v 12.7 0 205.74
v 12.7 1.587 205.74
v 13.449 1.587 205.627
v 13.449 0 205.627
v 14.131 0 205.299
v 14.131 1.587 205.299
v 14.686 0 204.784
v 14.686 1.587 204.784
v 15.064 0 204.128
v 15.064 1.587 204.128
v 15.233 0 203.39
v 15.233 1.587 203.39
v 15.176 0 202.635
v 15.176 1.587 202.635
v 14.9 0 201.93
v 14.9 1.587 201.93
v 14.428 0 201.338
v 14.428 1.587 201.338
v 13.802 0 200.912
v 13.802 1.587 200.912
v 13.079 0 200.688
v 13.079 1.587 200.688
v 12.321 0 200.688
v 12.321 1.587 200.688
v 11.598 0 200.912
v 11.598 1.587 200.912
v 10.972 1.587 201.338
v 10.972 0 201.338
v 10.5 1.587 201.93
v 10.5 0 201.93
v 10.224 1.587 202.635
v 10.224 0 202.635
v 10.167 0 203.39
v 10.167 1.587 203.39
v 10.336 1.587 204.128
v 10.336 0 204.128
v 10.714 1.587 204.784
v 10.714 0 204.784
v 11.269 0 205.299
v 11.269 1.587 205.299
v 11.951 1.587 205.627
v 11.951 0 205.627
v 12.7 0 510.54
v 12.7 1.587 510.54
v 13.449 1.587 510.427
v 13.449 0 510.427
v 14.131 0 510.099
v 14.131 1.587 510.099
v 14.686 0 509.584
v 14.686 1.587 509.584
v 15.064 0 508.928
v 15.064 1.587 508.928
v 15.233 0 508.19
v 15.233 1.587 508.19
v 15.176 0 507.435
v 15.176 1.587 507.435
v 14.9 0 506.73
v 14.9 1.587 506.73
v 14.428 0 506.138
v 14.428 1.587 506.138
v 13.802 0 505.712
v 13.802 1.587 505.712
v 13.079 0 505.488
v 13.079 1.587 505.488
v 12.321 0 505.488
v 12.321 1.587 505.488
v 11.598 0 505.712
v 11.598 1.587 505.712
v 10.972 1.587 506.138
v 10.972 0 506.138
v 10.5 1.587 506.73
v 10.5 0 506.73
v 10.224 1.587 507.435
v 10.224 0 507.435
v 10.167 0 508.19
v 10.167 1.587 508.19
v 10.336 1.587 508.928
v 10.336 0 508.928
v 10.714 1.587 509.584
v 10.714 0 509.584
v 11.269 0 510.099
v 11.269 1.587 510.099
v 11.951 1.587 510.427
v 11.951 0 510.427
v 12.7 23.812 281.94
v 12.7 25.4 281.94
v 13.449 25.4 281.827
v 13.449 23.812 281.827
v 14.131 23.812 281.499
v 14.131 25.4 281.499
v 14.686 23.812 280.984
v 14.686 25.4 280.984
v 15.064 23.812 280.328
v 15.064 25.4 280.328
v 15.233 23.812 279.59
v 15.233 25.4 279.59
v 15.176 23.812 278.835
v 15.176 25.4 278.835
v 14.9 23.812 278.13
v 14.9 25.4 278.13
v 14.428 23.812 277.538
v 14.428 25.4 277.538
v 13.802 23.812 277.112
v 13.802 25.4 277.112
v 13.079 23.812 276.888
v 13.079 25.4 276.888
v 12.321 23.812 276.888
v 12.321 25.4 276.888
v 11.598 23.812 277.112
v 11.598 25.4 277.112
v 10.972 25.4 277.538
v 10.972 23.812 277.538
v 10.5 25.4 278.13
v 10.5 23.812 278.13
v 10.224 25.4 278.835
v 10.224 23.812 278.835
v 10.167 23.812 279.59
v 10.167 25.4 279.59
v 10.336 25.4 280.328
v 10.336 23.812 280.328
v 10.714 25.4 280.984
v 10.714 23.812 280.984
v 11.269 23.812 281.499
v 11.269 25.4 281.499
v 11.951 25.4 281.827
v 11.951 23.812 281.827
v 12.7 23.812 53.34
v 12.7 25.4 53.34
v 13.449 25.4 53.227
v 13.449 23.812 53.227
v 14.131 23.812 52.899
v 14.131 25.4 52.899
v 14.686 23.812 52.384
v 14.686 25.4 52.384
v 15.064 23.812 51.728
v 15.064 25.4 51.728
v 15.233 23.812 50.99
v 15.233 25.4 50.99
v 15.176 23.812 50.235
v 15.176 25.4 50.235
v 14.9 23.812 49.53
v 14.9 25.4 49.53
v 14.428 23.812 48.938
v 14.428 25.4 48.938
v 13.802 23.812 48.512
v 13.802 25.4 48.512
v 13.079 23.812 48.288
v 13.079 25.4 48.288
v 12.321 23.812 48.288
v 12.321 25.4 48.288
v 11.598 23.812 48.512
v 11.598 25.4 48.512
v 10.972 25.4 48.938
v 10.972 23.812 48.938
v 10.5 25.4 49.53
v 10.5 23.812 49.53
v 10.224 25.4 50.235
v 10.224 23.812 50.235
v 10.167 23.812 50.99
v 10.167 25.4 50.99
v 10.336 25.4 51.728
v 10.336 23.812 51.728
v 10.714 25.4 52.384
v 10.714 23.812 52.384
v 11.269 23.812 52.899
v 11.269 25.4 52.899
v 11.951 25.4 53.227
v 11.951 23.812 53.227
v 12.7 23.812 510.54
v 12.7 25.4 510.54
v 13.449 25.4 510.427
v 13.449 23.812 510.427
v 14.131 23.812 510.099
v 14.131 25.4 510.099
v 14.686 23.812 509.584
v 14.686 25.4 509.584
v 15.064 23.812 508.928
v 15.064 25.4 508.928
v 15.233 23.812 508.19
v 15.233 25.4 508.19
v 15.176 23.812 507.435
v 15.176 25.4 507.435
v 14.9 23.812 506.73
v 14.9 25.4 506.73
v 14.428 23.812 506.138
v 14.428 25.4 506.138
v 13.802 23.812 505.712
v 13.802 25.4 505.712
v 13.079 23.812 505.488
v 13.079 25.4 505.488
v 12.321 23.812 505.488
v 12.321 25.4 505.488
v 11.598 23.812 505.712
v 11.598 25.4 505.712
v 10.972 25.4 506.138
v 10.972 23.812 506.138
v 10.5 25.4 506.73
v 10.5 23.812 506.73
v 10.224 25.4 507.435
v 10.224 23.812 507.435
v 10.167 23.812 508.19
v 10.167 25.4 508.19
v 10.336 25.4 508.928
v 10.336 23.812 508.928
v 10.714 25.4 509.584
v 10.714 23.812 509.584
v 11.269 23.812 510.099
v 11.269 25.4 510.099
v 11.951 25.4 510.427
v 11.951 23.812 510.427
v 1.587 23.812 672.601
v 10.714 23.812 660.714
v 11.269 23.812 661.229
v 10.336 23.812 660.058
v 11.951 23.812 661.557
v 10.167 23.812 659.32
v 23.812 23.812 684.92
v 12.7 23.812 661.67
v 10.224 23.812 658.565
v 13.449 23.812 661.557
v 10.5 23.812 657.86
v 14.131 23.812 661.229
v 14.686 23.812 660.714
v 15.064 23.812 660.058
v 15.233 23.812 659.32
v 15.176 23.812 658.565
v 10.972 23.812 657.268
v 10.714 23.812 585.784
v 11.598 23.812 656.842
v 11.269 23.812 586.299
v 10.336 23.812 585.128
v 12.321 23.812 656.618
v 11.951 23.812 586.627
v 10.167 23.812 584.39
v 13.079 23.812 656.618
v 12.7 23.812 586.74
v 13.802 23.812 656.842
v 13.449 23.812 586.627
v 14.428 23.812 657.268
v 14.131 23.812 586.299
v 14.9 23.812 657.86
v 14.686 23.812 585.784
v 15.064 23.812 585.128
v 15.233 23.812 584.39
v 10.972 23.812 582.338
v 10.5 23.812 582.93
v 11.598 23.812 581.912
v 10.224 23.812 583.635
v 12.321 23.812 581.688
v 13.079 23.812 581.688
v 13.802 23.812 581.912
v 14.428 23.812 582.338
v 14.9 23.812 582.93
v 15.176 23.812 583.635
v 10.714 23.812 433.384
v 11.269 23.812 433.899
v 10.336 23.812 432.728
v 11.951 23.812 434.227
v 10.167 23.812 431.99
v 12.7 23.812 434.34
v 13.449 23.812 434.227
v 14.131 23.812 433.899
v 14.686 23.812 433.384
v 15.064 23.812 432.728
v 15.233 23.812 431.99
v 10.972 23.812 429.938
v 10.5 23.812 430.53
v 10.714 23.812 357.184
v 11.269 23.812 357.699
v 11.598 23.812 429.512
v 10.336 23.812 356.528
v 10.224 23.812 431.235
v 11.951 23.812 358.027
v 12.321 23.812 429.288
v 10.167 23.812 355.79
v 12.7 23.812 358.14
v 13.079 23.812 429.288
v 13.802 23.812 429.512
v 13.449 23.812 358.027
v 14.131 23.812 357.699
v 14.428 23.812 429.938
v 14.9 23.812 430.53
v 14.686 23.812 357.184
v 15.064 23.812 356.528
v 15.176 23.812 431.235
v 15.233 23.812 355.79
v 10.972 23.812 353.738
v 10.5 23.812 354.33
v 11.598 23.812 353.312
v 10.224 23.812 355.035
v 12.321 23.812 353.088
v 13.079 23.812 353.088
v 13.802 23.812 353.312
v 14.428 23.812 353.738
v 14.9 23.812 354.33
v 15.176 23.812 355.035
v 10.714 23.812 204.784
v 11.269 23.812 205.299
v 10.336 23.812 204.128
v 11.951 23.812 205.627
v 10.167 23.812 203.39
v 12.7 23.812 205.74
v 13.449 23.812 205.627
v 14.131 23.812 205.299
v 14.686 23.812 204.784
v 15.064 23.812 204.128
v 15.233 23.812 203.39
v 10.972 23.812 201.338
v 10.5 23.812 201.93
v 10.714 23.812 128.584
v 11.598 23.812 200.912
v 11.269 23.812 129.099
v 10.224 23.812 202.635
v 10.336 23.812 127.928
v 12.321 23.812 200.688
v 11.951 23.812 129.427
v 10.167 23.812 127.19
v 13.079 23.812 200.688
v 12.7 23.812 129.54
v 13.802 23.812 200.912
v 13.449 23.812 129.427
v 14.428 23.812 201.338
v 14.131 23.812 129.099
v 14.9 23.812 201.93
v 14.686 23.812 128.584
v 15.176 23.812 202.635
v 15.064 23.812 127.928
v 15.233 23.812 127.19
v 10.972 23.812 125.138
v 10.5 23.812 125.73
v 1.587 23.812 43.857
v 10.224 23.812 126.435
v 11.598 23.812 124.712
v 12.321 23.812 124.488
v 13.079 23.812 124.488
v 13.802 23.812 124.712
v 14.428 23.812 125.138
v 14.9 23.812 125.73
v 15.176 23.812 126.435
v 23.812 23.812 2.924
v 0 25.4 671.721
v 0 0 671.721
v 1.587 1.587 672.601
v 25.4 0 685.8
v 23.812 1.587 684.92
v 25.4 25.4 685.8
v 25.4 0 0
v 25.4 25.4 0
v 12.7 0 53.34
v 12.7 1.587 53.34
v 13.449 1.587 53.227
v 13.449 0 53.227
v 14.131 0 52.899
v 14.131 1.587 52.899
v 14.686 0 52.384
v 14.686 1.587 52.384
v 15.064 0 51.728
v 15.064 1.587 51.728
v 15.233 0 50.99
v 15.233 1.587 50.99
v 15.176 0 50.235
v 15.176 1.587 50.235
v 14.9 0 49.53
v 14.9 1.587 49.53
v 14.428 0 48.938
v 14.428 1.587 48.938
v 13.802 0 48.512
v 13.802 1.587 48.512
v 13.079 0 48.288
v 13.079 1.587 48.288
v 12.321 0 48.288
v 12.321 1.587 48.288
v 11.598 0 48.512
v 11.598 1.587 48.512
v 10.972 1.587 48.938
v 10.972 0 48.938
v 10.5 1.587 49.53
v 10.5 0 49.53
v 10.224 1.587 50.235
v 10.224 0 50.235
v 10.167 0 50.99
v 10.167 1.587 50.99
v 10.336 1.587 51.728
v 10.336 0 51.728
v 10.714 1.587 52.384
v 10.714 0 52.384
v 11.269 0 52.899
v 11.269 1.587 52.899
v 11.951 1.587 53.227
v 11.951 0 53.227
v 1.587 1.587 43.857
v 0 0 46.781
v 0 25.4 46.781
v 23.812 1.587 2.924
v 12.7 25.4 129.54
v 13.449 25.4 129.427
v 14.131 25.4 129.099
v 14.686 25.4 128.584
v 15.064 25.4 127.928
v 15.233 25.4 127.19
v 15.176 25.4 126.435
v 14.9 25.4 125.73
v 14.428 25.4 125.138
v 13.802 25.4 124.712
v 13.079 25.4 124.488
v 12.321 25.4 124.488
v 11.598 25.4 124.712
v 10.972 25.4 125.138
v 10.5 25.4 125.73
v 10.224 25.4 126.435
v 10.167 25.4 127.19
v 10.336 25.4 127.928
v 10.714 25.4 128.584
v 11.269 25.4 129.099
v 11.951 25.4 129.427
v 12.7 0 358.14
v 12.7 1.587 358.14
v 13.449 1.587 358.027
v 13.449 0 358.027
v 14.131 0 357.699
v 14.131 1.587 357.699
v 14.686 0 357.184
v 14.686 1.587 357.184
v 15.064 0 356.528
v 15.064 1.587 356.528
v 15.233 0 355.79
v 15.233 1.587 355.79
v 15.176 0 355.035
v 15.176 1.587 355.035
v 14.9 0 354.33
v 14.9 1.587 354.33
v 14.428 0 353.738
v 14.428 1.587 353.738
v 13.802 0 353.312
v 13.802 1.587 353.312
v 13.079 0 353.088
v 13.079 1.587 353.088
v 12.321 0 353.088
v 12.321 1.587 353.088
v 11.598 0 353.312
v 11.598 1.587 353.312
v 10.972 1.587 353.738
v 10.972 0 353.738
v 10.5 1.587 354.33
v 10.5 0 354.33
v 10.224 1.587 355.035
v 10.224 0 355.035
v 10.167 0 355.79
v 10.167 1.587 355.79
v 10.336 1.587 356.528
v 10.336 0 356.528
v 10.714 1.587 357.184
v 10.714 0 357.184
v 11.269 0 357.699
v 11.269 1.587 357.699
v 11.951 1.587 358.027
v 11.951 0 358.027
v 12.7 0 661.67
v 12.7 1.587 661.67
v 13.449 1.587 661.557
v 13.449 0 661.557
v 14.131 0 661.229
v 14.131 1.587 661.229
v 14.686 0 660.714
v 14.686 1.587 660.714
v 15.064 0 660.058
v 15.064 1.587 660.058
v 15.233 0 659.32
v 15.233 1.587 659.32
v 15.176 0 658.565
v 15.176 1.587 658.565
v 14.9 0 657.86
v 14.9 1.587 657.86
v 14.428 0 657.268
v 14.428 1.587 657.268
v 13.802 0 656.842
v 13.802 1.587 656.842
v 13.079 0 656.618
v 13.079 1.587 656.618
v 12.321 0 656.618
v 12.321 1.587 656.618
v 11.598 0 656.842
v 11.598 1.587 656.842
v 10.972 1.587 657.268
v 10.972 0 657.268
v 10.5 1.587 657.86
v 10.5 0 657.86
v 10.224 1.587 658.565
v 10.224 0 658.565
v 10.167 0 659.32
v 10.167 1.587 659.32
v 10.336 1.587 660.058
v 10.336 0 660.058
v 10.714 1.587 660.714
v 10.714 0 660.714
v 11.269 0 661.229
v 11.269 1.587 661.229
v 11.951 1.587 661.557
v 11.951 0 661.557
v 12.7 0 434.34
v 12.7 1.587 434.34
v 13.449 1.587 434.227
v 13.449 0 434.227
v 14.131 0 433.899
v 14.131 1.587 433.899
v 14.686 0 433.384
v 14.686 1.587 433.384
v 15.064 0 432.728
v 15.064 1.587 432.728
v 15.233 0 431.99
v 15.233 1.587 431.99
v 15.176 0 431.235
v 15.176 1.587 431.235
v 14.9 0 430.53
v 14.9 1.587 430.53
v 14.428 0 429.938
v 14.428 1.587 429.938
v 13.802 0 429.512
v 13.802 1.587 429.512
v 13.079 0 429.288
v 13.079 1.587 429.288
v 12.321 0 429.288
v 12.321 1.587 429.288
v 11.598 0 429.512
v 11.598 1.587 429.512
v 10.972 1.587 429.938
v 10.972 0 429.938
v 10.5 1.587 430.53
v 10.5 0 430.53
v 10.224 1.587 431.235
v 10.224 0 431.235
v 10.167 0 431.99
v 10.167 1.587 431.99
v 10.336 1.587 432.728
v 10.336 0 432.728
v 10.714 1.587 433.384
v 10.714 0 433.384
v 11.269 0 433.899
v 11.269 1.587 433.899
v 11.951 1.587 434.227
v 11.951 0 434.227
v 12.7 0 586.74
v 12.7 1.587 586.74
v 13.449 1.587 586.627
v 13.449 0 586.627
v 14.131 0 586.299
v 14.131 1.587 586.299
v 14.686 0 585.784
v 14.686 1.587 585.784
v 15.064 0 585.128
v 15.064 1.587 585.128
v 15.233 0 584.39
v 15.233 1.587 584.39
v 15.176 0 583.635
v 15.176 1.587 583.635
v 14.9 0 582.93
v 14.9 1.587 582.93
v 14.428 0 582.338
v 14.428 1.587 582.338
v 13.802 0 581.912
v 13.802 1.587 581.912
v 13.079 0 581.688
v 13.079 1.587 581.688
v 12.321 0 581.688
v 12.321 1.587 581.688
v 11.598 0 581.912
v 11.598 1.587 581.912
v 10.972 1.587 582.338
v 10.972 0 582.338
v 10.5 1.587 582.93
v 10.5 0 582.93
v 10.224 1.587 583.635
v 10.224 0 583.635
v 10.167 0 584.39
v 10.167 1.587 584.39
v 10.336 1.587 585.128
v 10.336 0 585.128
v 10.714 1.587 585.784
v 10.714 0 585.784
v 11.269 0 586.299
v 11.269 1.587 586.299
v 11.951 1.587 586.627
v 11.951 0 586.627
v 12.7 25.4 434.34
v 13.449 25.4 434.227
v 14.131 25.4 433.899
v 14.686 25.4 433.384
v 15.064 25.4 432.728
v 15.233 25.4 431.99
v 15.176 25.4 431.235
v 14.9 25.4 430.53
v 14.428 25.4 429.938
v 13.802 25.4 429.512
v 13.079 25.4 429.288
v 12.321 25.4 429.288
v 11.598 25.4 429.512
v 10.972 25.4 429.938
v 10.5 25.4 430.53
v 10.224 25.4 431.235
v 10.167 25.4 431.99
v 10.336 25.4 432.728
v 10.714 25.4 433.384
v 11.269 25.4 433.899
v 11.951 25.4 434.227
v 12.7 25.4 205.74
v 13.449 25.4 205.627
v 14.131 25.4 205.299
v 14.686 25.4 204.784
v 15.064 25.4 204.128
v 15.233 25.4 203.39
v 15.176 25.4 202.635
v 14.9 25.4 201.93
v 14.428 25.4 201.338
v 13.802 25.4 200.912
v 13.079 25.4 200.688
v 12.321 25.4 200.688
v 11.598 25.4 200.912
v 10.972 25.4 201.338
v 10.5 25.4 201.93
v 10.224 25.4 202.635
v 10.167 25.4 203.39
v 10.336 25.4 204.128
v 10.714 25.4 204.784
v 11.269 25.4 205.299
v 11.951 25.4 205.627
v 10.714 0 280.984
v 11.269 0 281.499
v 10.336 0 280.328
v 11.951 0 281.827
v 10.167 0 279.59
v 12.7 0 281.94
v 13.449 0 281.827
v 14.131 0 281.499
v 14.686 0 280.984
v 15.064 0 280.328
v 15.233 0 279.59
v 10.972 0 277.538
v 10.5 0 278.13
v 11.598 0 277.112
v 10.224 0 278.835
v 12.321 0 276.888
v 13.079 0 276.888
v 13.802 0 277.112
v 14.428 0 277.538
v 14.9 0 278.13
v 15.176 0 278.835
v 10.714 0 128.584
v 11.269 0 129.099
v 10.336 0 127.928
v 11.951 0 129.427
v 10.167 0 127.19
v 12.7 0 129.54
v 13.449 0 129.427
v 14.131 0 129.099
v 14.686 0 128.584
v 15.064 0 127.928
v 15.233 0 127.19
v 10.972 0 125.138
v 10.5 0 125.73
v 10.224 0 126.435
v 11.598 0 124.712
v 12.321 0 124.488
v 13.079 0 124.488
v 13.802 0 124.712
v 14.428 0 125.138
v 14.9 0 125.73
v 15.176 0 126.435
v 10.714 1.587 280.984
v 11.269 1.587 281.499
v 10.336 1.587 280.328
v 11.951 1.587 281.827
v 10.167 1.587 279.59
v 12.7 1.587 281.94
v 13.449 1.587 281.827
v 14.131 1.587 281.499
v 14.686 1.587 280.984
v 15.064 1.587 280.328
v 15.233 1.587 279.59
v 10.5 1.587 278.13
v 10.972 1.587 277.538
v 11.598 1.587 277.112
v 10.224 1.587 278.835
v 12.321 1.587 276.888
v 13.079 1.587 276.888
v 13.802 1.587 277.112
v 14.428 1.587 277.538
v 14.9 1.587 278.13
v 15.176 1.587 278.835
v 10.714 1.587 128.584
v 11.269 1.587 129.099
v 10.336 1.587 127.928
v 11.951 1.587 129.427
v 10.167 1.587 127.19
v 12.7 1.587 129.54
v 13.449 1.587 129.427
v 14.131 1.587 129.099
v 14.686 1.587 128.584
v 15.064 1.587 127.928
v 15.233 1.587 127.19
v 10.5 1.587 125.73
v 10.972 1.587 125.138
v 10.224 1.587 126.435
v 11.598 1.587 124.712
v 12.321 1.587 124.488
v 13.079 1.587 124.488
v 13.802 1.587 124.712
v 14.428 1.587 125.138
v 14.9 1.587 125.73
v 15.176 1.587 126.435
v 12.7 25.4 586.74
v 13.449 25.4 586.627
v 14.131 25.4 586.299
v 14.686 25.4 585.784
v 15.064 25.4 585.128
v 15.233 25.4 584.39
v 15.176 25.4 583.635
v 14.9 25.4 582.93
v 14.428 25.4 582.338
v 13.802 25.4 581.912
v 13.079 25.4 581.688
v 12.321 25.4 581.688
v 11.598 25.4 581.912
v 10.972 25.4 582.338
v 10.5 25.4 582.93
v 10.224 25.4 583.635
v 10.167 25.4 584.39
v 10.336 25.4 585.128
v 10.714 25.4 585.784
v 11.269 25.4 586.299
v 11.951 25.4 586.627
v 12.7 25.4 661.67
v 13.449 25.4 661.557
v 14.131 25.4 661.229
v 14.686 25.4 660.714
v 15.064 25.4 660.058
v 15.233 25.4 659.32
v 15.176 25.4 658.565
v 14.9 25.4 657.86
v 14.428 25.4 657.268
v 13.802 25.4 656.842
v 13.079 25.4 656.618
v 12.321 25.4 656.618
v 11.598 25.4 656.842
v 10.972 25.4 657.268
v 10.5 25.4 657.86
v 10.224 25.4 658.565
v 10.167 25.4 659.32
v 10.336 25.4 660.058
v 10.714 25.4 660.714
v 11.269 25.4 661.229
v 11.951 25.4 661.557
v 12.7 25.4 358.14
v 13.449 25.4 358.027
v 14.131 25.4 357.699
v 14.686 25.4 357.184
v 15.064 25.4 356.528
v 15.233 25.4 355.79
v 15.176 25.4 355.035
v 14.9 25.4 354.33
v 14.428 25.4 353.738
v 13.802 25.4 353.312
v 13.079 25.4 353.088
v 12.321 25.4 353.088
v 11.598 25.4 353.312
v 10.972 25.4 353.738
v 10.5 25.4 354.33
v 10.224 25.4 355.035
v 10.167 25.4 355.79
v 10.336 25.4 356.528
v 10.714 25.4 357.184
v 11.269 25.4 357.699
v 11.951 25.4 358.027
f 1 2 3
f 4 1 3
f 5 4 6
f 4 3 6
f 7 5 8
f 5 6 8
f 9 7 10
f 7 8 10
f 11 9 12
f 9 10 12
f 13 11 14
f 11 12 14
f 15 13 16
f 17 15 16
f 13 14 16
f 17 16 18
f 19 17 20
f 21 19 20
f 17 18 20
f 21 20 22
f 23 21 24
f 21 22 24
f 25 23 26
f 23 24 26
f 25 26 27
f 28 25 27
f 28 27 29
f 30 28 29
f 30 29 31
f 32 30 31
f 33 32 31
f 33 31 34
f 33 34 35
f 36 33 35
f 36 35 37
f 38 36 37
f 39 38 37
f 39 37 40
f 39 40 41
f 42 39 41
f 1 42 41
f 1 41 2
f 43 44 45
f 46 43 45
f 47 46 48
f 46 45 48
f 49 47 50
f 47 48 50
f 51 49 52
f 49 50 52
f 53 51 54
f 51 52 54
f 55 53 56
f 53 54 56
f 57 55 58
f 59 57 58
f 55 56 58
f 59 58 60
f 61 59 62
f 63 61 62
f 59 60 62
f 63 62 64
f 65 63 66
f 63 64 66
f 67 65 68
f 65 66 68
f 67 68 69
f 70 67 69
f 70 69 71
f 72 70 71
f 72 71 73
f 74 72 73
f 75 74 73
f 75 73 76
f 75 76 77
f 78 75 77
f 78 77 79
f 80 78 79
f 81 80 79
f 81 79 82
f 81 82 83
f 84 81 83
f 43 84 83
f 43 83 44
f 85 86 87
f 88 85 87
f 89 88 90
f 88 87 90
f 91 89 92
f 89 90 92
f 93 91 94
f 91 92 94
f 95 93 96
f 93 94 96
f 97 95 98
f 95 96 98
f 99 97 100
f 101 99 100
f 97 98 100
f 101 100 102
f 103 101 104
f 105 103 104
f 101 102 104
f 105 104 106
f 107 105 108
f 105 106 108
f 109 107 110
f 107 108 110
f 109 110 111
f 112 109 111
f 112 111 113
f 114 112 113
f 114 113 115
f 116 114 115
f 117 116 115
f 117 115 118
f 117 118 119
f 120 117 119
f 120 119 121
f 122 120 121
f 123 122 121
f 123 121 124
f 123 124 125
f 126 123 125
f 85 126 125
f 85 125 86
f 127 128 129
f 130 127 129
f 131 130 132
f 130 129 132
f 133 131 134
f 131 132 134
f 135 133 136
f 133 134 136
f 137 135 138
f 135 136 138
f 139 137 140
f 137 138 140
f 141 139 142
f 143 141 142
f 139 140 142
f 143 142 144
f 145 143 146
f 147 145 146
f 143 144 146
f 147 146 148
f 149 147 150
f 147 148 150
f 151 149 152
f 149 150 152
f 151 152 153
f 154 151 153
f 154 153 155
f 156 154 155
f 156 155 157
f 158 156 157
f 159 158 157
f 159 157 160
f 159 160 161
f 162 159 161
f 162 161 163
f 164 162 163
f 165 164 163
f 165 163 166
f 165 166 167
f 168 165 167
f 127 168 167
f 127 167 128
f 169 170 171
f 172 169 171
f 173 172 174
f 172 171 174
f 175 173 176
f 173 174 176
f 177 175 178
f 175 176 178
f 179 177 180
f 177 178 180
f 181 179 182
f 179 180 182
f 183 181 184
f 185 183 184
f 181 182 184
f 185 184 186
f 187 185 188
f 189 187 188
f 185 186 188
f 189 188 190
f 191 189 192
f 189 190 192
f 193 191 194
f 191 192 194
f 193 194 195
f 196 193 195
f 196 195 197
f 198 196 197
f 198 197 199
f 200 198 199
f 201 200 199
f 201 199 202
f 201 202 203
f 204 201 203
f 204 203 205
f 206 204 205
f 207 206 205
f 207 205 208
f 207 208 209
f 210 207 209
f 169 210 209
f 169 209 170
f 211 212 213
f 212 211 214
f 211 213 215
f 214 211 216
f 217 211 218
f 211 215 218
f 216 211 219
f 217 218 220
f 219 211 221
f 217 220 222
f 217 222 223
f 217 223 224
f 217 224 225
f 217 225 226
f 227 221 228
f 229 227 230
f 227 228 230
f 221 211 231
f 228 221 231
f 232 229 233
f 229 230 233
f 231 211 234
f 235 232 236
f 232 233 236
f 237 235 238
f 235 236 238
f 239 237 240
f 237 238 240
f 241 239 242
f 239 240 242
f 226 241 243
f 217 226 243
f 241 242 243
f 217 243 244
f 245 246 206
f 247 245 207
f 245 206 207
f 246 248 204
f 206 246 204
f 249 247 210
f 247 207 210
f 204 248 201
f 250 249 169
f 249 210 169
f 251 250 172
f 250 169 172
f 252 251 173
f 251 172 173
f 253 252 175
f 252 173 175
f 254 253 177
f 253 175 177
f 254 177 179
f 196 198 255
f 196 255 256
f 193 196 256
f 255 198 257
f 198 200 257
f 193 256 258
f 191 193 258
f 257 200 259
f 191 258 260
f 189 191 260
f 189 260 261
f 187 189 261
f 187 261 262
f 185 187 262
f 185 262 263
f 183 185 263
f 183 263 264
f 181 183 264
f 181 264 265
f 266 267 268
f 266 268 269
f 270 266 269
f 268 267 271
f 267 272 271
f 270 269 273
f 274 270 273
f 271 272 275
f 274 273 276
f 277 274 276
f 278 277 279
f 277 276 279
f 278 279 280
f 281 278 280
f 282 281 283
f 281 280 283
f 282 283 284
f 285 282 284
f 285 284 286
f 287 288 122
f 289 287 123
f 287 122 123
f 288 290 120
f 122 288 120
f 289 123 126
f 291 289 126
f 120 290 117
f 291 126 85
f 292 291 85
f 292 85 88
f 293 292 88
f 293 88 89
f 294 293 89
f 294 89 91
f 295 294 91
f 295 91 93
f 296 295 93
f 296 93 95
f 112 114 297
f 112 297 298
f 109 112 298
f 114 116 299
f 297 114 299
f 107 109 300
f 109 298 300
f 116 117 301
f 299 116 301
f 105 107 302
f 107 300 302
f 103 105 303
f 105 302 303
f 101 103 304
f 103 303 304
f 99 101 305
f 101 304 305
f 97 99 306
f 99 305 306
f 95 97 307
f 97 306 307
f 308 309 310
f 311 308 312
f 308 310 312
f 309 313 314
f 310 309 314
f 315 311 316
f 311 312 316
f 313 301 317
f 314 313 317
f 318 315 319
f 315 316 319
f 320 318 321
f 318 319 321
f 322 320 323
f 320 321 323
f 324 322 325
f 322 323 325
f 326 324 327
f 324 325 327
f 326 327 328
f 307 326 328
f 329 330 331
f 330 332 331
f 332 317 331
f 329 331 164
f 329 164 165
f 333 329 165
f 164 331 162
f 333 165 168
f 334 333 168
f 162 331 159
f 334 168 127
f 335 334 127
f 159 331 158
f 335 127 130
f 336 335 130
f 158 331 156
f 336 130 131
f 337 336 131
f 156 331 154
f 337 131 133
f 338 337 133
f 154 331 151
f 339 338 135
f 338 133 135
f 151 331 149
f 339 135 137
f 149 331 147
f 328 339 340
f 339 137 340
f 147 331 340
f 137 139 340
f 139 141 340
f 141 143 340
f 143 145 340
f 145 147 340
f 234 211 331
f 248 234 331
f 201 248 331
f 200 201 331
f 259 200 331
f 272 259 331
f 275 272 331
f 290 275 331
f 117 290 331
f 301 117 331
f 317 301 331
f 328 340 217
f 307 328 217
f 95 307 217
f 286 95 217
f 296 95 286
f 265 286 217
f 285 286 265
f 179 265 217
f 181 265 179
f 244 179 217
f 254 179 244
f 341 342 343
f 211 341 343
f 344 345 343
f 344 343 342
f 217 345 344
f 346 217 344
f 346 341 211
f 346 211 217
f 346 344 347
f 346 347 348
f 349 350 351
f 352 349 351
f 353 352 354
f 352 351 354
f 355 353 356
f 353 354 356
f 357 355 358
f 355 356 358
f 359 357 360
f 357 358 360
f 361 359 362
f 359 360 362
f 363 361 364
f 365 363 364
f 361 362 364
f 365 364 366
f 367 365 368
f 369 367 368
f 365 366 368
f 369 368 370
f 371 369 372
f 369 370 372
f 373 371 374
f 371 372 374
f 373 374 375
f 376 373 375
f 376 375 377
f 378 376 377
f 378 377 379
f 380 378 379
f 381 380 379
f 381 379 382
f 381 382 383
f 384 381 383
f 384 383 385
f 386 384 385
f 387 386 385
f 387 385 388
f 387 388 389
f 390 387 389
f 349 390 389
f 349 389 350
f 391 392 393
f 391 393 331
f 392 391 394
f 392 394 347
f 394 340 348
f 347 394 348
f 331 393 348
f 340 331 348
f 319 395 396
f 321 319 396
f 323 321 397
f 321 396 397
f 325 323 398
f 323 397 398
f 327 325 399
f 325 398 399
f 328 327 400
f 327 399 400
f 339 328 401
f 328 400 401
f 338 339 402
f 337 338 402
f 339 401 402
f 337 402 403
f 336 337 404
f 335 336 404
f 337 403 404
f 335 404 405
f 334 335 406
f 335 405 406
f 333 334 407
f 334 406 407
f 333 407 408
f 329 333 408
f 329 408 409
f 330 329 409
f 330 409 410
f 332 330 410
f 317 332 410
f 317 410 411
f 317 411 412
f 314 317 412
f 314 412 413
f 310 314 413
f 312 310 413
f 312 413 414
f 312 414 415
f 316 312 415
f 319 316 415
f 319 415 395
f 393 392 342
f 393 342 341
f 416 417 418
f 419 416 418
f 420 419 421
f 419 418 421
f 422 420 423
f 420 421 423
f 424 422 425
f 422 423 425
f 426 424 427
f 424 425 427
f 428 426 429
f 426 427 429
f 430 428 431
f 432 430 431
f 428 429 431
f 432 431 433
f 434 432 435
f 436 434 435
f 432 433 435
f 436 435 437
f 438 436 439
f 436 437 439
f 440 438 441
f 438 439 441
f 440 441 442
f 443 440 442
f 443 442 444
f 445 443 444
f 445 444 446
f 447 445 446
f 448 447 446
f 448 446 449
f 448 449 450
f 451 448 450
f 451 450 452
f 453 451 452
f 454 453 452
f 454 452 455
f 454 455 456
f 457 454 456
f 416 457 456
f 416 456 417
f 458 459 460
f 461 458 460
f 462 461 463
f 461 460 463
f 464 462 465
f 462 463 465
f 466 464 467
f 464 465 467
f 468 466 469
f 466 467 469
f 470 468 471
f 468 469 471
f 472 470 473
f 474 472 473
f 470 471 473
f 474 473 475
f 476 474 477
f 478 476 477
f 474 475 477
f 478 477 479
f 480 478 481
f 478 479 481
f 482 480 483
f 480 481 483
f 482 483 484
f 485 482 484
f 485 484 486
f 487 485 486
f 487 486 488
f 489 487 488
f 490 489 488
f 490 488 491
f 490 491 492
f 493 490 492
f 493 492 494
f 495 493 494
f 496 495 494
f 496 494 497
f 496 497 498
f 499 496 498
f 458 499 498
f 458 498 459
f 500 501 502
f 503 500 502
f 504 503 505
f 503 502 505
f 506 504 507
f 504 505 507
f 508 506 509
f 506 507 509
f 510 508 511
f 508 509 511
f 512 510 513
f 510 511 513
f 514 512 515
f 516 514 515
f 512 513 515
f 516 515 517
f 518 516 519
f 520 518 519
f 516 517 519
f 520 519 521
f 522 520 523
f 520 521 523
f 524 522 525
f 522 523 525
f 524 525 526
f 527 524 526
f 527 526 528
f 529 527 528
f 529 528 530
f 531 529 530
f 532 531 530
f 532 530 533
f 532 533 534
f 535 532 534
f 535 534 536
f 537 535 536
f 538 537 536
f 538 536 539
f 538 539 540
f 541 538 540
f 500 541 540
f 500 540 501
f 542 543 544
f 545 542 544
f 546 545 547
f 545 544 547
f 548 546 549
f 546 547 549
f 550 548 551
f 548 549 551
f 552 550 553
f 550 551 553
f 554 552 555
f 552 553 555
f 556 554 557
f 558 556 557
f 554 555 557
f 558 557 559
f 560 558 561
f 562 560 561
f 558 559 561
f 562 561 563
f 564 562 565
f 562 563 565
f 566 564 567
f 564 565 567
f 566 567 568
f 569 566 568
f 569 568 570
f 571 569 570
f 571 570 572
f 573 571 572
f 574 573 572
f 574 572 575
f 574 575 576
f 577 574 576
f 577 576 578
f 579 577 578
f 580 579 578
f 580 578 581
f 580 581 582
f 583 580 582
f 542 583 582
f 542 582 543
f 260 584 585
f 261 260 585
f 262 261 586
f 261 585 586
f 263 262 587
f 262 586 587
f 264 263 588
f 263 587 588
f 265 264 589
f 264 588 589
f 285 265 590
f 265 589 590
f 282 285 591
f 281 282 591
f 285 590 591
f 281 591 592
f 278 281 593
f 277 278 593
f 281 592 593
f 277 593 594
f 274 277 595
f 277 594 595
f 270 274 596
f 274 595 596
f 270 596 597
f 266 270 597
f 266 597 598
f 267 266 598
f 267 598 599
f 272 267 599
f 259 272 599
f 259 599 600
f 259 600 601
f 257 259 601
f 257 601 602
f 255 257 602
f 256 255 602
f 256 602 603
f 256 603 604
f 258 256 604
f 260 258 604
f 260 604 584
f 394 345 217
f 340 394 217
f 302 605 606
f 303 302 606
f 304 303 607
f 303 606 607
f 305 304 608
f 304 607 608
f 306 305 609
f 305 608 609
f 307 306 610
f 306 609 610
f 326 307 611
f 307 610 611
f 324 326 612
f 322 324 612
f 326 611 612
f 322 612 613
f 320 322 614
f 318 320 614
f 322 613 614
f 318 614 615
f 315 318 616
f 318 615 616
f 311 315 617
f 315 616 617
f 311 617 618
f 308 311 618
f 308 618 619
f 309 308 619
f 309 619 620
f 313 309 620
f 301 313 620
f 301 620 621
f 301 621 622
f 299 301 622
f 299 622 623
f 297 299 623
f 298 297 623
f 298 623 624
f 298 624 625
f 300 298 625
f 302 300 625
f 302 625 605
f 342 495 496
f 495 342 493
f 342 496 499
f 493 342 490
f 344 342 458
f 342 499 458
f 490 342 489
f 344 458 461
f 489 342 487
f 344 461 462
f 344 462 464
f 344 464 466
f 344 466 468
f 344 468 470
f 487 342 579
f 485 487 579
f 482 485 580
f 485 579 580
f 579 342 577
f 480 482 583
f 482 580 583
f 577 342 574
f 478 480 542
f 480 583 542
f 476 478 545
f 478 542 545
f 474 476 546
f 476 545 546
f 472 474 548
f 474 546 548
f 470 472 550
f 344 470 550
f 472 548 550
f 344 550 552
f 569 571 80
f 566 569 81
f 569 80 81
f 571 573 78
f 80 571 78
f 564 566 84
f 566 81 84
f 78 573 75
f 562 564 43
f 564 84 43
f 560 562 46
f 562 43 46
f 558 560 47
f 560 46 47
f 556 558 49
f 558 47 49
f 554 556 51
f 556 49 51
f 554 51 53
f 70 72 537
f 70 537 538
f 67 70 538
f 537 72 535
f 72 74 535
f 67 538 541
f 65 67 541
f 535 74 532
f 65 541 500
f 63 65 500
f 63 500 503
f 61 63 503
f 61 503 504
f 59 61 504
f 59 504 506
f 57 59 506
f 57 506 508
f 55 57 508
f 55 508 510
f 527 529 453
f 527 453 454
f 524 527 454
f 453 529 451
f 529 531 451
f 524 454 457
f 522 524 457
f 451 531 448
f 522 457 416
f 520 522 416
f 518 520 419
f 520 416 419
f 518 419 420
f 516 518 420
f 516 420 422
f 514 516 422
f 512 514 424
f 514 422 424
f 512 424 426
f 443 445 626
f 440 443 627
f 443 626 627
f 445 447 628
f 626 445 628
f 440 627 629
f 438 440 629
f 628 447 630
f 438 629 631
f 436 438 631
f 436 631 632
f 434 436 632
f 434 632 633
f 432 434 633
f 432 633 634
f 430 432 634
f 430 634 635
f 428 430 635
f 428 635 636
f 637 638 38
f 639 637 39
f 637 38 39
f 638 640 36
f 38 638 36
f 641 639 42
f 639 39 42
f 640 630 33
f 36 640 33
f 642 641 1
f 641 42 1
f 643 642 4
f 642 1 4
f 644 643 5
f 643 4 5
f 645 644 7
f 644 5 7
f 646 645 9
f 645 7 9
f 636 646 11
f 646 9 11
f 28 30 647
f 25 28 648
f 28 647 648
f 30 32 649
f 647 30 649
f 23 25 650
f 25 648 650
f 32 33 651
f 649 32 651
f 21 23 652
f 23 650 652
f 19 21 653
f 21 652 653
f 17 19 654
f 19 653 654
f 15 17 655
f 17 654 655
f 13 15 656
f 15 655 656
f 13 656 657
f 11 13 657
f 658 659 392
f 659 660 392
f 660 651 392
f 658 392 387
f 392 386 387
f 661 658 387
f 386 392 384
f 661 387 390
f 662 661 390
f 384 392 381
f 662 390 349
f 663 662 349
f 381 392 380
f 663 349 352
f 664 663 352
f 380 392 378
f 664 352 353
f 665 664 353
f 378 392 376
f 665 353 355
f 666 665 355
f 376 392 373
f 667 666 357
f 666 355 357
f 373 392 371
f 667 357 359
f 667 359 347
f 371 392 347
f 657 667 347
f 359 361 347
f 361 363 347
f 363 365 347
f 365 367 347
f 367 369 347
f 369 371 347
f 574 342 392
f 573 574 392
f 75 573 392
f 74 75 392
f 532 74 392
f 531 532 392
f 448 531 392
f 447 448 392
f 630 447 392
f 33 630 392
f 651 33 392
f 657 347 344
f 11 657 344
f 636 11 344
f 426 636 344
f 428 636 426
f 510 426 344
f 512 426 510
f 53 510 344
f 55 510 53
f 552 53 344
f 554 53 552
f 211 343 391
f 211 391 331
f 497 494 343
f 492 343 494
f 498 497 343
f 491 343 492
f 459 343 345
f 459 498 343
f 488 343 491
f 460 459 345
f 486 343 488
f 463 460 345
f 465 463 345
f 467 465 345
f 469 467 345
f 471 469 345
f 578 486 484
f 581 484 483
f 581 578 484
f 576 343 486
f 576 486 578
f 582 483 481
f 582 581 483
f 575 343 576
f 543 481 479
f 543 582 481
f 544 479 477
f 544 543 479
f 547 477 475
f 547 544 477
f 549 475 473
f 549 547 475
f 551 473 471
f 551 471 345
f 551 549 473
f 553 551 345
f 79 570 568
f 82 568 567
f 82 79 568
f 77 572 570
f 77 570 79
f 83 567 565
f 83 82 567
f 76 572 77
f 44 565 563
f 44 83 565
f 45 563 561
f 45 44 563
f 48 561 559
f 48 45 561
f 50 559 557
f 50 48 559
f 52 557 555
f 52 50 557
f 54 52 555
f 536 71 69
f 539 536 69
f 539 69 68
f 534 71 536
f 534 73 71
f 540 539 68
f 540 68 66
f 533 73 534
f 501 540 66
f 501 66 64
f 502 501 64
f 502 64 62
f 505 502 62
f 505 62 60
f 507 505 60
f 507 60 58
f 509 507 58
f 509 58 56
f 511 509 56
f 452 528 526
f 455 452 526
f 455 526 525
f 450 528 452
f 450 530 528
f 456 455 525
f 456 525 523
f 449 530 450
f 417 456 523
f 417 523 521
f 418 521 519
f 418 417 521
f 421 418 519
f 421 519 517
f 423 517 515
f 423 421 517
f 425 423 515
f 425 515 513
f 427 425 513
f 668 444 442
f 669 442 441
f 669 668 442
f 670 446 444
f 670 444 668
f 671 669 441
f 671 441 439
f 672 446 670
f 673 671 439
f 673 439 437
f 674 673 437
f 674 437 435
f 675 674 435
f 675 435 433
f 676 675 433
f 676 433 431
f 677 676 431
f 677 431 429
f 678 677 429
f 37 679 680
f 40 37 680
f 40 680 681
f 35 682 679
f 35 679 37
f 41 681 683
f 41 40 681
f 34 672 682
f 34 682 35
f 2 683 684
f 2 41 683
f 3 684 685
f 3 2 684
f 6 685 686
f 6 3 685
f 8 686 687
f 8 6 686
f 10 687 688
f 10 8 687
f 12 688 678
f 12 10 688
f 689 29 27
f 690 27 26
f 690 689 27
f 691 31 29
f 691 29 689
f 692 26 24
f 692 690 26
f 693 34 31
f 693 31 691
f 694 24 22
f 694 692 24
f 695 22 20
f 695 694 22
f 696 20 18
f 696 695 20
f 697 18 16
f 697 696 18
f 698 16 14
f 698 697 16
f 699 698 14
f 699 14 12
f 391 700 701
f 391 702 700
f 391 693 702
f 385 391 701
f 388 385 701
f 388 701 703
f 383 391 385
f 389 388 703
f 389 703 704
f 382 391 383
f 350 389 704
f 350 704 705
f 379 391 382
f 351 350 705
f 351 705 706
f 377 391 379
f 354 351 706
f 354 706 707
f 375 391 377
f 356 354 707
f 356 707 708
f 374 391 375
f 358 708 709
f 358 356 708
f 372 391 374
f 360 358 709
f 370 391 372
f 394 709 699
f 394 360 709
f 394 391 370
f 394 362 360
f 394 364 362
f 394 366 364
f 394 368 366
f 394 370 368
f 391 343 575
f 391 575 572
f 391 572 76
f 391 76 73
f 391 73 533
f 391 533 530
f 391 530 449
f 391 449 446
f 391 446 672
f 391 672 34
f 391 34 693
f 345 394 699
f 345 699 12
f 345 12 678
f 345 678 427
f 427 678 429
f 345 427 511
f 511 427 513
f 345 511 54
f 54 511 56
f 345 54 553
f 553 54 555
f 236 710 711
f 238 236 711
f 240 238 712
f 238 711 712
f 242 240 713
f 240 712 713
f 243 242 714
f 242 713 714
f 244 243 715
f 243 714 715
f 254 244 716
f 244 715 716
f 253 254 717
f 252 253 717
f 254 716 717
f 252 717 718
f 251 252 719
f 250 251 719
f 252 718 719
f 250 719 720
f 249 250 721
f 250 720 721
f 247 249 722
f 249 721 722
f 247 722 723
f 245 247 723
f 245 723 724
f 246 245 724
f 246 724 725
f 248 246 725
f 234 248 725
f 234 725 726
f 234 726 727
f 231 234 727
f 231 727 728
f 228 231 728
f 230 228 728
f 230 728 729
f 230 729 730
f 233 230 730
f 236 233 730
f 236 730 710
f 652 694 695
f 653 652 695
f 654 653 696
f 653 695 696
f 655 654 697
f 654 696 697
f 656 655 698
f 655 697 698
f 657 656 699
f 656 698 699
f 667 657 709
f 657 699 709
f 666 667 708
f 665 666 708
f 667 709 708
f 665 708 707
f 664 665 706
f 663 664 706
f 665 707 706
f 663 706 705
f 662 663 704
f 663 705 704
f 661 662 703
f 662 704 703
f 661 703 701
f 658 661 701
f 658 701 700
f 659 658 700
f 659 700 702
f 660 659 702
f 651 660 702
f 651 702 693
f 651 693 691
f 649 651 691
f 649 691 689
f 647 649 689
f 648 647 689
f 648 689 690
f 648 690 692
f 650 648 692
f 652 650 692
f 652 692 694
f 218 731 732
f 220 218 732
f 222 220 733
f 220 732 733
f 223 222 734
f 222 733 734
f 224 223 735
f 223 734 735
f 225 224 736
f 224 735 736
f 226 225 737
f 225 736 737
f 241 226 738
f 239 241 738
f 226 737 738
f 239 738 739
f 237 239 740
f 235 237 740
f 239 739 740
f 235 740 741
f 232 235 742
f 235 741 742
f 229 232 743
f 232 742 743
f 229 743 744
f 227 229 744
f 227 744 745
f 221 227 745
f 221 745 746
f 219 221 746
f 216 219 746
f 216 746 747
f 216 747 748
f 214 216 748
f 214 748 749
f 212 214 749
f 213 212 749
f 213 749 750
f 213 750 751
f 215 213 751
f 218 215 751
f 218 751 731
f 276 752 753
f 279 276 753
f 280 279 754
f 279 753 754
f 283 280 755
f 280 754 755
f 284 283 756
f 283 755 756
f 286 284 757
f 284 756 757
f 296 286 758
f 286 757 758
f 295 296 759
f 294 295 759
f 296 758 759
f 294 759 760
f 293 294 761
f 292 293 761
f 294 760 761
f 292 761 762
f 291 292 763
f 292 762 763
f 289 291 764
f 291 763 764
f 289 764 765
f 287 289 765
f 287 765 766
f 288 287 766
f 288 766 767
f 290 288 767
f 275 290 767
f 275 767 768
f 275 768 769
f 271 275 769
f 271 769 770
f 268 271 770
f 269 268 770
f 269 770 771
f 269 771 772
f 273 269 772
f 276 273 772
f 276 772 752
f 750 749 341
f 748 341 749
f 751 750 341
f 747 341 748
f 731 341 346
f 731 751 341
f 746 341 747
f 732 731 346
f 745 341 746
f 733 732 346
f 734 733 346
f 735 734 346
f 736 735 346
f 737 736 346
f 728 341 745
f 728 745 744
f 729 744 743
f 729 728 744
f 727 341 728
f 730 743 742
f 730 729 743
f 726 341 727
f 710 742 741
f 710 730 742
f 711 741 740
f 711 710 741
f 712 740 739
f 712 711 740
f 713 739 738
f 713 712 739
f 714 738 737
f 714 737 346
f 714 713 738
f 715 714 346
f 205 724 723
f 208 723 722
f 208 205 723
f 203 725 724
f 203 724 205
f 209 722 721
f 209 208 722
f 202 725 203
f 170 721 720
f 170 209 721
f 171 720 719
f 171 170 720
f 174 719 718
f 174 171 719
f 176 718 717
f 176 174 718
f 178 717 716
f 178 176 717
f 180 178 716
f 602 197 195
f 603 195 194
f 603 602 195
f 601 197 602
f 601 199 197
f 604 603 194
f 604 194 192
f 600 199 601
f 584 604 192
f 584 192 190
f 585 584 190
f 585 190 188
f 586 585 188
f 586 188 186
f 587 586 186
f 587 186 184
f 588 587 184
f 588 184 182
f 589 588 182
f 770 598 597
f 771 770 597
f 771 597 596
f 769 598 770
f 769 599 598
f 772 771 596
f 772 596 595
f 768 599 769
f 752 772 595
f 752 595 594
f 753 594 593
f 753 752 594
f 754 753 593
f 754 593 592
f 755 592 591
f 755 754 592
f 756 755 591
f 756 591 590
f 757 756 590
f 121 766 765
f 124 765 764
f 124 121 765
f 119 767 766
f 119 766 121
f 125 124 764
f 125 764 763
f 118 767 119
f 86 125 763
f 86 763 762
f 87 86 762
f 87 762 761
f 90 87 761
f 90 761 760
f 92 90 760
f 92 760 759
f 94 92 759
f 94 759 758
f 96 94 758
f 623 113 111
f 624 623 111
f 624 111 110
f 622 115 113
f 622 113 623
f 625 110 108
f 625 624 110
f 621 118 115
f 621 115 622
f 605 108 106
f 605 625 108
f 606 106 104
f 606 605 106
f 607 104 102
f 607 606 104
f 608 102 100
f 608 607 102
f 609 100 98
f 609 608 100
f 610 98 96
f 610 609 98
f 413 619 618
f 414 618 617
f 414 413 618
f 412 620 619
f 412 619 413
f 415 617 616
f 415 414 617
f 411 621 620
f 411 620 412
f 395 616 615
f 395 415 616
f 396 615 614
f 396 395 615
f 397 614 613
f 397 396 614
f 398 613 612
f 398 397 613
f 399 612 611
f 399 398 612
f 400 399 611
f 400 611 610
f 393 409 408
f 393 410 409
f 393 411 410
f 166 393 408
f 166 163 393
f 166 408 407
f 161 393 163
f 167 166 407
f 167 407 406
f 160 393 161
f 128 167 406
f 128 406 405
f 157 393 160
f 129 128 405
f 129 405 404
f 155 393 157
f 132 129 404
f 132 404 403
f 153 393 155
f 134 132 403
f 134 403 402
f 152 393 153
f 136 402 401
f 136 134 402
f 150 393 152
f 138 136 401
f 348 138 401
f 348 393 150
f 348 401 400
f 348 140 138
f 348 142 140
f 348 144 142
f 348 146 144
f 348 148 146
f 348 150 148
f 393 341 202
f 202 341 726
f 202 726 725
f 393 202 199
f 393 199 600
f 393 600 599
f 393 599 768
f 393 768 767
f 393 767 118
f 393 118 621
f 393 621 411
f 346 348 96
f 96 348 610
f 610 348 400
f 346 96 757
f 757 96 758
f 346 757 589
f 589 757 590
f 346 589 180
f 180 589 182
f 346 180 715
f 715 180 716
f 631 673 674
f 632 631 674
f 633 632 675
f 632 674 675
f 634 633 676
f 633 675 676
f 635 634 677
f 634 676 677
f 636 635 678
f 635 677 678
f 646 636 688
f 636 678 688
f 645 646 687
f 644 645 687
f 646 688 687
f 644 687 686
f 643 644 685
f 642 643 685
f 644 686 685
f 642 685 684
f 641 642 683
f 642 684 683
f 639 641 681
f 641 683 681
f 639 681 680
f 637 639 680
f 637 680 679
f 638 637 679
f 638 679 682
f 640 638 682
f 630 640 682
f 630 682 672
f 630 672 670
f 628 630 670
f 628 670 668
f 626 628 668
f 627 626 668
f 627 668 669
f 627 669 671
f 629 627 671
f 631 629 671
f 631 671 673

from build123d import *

# Parameters (mm, degrees)
SKETCH1_W           = 25.4
SKETCH1_H           = 25.4
SKETCH1_W_2         = 22.225
SKETCH1_H_2         = 22.225
BOSS_EXTRUDE1_DEPTH = 685.8
SKETCH3_R           = 2.54
CUT_EXTRUDE2_DEPTH  = 687.740096397


with BuildPart() as part:
    # Sketch1 → Boss-Extrude1 (new body)
    with BuildSketch(Plane.XY):
        with Locations((12.7, 12.7)):
            Rectangle(SKETCH1_W, SKETCH1_H)
        with Locations((12.7, 12.7)):
            Rectangle(SKETCH1_W_2, SKETCH1_H_2, mode=Mode.SUBTRACT)
    extrude(amount=BOSS_EXTRUDE1_DEPTH)

    # Sketch3 → Cut-Extrude2 (cut, through all)
    with BuildSketch(Plane(origin=(0, 25.4, 0), x_dir=(1, 0, 0), z_dir=(0, 1, 0))):
        with Locations(Location((12.7, -50.8, 0), (0, 0, 270))):
            Circle(SKETCH3_R)
        with Locations(Location((12.7, -127, 0), (0, 0, 270))):
            Circle(SKETCH3_R)
        with Locations(Location((12.7, -203.2, 0), (0, 0, 270))):
            Circle(SKETCH3_R)
        with Locations(Location((12.7, -279.4, 0), (0, 0, 270))):
            Circle(SKETCH3_R)
        with Locations(Location((12.7, -355.6, 0), (0, 0, 270))):
            Circle(SKETCH3_R)
        with Locations(Location((12.7, -431.8, 0), (0, 0, 270))):
            Circle(SKETCH3_R)
        with Locations(Location((12.7, -508, 0), (0, 0, 270))):
            Circle(SKETCH3_R)
        with Locations(Location((12.7, -584.2, 0), (0, 0, 270))):
            Circle(SKETCH3_R)
        with Locations(Location((12.7, -659.13, 0), (0, 0, 270))):
            Circle(SKETCH3_R)
        Polygon((0, 0), (0, -46.780980505), (25.4, 0), align=None)
        Polygon((0, -685.8), (0, -671.720550093), (25.4, -685.8), align=None)
    extrude(amount=-CUT_EXTRUDE2_DEPTH, mode=Mode.SUBTRACT)


solid = part.part
